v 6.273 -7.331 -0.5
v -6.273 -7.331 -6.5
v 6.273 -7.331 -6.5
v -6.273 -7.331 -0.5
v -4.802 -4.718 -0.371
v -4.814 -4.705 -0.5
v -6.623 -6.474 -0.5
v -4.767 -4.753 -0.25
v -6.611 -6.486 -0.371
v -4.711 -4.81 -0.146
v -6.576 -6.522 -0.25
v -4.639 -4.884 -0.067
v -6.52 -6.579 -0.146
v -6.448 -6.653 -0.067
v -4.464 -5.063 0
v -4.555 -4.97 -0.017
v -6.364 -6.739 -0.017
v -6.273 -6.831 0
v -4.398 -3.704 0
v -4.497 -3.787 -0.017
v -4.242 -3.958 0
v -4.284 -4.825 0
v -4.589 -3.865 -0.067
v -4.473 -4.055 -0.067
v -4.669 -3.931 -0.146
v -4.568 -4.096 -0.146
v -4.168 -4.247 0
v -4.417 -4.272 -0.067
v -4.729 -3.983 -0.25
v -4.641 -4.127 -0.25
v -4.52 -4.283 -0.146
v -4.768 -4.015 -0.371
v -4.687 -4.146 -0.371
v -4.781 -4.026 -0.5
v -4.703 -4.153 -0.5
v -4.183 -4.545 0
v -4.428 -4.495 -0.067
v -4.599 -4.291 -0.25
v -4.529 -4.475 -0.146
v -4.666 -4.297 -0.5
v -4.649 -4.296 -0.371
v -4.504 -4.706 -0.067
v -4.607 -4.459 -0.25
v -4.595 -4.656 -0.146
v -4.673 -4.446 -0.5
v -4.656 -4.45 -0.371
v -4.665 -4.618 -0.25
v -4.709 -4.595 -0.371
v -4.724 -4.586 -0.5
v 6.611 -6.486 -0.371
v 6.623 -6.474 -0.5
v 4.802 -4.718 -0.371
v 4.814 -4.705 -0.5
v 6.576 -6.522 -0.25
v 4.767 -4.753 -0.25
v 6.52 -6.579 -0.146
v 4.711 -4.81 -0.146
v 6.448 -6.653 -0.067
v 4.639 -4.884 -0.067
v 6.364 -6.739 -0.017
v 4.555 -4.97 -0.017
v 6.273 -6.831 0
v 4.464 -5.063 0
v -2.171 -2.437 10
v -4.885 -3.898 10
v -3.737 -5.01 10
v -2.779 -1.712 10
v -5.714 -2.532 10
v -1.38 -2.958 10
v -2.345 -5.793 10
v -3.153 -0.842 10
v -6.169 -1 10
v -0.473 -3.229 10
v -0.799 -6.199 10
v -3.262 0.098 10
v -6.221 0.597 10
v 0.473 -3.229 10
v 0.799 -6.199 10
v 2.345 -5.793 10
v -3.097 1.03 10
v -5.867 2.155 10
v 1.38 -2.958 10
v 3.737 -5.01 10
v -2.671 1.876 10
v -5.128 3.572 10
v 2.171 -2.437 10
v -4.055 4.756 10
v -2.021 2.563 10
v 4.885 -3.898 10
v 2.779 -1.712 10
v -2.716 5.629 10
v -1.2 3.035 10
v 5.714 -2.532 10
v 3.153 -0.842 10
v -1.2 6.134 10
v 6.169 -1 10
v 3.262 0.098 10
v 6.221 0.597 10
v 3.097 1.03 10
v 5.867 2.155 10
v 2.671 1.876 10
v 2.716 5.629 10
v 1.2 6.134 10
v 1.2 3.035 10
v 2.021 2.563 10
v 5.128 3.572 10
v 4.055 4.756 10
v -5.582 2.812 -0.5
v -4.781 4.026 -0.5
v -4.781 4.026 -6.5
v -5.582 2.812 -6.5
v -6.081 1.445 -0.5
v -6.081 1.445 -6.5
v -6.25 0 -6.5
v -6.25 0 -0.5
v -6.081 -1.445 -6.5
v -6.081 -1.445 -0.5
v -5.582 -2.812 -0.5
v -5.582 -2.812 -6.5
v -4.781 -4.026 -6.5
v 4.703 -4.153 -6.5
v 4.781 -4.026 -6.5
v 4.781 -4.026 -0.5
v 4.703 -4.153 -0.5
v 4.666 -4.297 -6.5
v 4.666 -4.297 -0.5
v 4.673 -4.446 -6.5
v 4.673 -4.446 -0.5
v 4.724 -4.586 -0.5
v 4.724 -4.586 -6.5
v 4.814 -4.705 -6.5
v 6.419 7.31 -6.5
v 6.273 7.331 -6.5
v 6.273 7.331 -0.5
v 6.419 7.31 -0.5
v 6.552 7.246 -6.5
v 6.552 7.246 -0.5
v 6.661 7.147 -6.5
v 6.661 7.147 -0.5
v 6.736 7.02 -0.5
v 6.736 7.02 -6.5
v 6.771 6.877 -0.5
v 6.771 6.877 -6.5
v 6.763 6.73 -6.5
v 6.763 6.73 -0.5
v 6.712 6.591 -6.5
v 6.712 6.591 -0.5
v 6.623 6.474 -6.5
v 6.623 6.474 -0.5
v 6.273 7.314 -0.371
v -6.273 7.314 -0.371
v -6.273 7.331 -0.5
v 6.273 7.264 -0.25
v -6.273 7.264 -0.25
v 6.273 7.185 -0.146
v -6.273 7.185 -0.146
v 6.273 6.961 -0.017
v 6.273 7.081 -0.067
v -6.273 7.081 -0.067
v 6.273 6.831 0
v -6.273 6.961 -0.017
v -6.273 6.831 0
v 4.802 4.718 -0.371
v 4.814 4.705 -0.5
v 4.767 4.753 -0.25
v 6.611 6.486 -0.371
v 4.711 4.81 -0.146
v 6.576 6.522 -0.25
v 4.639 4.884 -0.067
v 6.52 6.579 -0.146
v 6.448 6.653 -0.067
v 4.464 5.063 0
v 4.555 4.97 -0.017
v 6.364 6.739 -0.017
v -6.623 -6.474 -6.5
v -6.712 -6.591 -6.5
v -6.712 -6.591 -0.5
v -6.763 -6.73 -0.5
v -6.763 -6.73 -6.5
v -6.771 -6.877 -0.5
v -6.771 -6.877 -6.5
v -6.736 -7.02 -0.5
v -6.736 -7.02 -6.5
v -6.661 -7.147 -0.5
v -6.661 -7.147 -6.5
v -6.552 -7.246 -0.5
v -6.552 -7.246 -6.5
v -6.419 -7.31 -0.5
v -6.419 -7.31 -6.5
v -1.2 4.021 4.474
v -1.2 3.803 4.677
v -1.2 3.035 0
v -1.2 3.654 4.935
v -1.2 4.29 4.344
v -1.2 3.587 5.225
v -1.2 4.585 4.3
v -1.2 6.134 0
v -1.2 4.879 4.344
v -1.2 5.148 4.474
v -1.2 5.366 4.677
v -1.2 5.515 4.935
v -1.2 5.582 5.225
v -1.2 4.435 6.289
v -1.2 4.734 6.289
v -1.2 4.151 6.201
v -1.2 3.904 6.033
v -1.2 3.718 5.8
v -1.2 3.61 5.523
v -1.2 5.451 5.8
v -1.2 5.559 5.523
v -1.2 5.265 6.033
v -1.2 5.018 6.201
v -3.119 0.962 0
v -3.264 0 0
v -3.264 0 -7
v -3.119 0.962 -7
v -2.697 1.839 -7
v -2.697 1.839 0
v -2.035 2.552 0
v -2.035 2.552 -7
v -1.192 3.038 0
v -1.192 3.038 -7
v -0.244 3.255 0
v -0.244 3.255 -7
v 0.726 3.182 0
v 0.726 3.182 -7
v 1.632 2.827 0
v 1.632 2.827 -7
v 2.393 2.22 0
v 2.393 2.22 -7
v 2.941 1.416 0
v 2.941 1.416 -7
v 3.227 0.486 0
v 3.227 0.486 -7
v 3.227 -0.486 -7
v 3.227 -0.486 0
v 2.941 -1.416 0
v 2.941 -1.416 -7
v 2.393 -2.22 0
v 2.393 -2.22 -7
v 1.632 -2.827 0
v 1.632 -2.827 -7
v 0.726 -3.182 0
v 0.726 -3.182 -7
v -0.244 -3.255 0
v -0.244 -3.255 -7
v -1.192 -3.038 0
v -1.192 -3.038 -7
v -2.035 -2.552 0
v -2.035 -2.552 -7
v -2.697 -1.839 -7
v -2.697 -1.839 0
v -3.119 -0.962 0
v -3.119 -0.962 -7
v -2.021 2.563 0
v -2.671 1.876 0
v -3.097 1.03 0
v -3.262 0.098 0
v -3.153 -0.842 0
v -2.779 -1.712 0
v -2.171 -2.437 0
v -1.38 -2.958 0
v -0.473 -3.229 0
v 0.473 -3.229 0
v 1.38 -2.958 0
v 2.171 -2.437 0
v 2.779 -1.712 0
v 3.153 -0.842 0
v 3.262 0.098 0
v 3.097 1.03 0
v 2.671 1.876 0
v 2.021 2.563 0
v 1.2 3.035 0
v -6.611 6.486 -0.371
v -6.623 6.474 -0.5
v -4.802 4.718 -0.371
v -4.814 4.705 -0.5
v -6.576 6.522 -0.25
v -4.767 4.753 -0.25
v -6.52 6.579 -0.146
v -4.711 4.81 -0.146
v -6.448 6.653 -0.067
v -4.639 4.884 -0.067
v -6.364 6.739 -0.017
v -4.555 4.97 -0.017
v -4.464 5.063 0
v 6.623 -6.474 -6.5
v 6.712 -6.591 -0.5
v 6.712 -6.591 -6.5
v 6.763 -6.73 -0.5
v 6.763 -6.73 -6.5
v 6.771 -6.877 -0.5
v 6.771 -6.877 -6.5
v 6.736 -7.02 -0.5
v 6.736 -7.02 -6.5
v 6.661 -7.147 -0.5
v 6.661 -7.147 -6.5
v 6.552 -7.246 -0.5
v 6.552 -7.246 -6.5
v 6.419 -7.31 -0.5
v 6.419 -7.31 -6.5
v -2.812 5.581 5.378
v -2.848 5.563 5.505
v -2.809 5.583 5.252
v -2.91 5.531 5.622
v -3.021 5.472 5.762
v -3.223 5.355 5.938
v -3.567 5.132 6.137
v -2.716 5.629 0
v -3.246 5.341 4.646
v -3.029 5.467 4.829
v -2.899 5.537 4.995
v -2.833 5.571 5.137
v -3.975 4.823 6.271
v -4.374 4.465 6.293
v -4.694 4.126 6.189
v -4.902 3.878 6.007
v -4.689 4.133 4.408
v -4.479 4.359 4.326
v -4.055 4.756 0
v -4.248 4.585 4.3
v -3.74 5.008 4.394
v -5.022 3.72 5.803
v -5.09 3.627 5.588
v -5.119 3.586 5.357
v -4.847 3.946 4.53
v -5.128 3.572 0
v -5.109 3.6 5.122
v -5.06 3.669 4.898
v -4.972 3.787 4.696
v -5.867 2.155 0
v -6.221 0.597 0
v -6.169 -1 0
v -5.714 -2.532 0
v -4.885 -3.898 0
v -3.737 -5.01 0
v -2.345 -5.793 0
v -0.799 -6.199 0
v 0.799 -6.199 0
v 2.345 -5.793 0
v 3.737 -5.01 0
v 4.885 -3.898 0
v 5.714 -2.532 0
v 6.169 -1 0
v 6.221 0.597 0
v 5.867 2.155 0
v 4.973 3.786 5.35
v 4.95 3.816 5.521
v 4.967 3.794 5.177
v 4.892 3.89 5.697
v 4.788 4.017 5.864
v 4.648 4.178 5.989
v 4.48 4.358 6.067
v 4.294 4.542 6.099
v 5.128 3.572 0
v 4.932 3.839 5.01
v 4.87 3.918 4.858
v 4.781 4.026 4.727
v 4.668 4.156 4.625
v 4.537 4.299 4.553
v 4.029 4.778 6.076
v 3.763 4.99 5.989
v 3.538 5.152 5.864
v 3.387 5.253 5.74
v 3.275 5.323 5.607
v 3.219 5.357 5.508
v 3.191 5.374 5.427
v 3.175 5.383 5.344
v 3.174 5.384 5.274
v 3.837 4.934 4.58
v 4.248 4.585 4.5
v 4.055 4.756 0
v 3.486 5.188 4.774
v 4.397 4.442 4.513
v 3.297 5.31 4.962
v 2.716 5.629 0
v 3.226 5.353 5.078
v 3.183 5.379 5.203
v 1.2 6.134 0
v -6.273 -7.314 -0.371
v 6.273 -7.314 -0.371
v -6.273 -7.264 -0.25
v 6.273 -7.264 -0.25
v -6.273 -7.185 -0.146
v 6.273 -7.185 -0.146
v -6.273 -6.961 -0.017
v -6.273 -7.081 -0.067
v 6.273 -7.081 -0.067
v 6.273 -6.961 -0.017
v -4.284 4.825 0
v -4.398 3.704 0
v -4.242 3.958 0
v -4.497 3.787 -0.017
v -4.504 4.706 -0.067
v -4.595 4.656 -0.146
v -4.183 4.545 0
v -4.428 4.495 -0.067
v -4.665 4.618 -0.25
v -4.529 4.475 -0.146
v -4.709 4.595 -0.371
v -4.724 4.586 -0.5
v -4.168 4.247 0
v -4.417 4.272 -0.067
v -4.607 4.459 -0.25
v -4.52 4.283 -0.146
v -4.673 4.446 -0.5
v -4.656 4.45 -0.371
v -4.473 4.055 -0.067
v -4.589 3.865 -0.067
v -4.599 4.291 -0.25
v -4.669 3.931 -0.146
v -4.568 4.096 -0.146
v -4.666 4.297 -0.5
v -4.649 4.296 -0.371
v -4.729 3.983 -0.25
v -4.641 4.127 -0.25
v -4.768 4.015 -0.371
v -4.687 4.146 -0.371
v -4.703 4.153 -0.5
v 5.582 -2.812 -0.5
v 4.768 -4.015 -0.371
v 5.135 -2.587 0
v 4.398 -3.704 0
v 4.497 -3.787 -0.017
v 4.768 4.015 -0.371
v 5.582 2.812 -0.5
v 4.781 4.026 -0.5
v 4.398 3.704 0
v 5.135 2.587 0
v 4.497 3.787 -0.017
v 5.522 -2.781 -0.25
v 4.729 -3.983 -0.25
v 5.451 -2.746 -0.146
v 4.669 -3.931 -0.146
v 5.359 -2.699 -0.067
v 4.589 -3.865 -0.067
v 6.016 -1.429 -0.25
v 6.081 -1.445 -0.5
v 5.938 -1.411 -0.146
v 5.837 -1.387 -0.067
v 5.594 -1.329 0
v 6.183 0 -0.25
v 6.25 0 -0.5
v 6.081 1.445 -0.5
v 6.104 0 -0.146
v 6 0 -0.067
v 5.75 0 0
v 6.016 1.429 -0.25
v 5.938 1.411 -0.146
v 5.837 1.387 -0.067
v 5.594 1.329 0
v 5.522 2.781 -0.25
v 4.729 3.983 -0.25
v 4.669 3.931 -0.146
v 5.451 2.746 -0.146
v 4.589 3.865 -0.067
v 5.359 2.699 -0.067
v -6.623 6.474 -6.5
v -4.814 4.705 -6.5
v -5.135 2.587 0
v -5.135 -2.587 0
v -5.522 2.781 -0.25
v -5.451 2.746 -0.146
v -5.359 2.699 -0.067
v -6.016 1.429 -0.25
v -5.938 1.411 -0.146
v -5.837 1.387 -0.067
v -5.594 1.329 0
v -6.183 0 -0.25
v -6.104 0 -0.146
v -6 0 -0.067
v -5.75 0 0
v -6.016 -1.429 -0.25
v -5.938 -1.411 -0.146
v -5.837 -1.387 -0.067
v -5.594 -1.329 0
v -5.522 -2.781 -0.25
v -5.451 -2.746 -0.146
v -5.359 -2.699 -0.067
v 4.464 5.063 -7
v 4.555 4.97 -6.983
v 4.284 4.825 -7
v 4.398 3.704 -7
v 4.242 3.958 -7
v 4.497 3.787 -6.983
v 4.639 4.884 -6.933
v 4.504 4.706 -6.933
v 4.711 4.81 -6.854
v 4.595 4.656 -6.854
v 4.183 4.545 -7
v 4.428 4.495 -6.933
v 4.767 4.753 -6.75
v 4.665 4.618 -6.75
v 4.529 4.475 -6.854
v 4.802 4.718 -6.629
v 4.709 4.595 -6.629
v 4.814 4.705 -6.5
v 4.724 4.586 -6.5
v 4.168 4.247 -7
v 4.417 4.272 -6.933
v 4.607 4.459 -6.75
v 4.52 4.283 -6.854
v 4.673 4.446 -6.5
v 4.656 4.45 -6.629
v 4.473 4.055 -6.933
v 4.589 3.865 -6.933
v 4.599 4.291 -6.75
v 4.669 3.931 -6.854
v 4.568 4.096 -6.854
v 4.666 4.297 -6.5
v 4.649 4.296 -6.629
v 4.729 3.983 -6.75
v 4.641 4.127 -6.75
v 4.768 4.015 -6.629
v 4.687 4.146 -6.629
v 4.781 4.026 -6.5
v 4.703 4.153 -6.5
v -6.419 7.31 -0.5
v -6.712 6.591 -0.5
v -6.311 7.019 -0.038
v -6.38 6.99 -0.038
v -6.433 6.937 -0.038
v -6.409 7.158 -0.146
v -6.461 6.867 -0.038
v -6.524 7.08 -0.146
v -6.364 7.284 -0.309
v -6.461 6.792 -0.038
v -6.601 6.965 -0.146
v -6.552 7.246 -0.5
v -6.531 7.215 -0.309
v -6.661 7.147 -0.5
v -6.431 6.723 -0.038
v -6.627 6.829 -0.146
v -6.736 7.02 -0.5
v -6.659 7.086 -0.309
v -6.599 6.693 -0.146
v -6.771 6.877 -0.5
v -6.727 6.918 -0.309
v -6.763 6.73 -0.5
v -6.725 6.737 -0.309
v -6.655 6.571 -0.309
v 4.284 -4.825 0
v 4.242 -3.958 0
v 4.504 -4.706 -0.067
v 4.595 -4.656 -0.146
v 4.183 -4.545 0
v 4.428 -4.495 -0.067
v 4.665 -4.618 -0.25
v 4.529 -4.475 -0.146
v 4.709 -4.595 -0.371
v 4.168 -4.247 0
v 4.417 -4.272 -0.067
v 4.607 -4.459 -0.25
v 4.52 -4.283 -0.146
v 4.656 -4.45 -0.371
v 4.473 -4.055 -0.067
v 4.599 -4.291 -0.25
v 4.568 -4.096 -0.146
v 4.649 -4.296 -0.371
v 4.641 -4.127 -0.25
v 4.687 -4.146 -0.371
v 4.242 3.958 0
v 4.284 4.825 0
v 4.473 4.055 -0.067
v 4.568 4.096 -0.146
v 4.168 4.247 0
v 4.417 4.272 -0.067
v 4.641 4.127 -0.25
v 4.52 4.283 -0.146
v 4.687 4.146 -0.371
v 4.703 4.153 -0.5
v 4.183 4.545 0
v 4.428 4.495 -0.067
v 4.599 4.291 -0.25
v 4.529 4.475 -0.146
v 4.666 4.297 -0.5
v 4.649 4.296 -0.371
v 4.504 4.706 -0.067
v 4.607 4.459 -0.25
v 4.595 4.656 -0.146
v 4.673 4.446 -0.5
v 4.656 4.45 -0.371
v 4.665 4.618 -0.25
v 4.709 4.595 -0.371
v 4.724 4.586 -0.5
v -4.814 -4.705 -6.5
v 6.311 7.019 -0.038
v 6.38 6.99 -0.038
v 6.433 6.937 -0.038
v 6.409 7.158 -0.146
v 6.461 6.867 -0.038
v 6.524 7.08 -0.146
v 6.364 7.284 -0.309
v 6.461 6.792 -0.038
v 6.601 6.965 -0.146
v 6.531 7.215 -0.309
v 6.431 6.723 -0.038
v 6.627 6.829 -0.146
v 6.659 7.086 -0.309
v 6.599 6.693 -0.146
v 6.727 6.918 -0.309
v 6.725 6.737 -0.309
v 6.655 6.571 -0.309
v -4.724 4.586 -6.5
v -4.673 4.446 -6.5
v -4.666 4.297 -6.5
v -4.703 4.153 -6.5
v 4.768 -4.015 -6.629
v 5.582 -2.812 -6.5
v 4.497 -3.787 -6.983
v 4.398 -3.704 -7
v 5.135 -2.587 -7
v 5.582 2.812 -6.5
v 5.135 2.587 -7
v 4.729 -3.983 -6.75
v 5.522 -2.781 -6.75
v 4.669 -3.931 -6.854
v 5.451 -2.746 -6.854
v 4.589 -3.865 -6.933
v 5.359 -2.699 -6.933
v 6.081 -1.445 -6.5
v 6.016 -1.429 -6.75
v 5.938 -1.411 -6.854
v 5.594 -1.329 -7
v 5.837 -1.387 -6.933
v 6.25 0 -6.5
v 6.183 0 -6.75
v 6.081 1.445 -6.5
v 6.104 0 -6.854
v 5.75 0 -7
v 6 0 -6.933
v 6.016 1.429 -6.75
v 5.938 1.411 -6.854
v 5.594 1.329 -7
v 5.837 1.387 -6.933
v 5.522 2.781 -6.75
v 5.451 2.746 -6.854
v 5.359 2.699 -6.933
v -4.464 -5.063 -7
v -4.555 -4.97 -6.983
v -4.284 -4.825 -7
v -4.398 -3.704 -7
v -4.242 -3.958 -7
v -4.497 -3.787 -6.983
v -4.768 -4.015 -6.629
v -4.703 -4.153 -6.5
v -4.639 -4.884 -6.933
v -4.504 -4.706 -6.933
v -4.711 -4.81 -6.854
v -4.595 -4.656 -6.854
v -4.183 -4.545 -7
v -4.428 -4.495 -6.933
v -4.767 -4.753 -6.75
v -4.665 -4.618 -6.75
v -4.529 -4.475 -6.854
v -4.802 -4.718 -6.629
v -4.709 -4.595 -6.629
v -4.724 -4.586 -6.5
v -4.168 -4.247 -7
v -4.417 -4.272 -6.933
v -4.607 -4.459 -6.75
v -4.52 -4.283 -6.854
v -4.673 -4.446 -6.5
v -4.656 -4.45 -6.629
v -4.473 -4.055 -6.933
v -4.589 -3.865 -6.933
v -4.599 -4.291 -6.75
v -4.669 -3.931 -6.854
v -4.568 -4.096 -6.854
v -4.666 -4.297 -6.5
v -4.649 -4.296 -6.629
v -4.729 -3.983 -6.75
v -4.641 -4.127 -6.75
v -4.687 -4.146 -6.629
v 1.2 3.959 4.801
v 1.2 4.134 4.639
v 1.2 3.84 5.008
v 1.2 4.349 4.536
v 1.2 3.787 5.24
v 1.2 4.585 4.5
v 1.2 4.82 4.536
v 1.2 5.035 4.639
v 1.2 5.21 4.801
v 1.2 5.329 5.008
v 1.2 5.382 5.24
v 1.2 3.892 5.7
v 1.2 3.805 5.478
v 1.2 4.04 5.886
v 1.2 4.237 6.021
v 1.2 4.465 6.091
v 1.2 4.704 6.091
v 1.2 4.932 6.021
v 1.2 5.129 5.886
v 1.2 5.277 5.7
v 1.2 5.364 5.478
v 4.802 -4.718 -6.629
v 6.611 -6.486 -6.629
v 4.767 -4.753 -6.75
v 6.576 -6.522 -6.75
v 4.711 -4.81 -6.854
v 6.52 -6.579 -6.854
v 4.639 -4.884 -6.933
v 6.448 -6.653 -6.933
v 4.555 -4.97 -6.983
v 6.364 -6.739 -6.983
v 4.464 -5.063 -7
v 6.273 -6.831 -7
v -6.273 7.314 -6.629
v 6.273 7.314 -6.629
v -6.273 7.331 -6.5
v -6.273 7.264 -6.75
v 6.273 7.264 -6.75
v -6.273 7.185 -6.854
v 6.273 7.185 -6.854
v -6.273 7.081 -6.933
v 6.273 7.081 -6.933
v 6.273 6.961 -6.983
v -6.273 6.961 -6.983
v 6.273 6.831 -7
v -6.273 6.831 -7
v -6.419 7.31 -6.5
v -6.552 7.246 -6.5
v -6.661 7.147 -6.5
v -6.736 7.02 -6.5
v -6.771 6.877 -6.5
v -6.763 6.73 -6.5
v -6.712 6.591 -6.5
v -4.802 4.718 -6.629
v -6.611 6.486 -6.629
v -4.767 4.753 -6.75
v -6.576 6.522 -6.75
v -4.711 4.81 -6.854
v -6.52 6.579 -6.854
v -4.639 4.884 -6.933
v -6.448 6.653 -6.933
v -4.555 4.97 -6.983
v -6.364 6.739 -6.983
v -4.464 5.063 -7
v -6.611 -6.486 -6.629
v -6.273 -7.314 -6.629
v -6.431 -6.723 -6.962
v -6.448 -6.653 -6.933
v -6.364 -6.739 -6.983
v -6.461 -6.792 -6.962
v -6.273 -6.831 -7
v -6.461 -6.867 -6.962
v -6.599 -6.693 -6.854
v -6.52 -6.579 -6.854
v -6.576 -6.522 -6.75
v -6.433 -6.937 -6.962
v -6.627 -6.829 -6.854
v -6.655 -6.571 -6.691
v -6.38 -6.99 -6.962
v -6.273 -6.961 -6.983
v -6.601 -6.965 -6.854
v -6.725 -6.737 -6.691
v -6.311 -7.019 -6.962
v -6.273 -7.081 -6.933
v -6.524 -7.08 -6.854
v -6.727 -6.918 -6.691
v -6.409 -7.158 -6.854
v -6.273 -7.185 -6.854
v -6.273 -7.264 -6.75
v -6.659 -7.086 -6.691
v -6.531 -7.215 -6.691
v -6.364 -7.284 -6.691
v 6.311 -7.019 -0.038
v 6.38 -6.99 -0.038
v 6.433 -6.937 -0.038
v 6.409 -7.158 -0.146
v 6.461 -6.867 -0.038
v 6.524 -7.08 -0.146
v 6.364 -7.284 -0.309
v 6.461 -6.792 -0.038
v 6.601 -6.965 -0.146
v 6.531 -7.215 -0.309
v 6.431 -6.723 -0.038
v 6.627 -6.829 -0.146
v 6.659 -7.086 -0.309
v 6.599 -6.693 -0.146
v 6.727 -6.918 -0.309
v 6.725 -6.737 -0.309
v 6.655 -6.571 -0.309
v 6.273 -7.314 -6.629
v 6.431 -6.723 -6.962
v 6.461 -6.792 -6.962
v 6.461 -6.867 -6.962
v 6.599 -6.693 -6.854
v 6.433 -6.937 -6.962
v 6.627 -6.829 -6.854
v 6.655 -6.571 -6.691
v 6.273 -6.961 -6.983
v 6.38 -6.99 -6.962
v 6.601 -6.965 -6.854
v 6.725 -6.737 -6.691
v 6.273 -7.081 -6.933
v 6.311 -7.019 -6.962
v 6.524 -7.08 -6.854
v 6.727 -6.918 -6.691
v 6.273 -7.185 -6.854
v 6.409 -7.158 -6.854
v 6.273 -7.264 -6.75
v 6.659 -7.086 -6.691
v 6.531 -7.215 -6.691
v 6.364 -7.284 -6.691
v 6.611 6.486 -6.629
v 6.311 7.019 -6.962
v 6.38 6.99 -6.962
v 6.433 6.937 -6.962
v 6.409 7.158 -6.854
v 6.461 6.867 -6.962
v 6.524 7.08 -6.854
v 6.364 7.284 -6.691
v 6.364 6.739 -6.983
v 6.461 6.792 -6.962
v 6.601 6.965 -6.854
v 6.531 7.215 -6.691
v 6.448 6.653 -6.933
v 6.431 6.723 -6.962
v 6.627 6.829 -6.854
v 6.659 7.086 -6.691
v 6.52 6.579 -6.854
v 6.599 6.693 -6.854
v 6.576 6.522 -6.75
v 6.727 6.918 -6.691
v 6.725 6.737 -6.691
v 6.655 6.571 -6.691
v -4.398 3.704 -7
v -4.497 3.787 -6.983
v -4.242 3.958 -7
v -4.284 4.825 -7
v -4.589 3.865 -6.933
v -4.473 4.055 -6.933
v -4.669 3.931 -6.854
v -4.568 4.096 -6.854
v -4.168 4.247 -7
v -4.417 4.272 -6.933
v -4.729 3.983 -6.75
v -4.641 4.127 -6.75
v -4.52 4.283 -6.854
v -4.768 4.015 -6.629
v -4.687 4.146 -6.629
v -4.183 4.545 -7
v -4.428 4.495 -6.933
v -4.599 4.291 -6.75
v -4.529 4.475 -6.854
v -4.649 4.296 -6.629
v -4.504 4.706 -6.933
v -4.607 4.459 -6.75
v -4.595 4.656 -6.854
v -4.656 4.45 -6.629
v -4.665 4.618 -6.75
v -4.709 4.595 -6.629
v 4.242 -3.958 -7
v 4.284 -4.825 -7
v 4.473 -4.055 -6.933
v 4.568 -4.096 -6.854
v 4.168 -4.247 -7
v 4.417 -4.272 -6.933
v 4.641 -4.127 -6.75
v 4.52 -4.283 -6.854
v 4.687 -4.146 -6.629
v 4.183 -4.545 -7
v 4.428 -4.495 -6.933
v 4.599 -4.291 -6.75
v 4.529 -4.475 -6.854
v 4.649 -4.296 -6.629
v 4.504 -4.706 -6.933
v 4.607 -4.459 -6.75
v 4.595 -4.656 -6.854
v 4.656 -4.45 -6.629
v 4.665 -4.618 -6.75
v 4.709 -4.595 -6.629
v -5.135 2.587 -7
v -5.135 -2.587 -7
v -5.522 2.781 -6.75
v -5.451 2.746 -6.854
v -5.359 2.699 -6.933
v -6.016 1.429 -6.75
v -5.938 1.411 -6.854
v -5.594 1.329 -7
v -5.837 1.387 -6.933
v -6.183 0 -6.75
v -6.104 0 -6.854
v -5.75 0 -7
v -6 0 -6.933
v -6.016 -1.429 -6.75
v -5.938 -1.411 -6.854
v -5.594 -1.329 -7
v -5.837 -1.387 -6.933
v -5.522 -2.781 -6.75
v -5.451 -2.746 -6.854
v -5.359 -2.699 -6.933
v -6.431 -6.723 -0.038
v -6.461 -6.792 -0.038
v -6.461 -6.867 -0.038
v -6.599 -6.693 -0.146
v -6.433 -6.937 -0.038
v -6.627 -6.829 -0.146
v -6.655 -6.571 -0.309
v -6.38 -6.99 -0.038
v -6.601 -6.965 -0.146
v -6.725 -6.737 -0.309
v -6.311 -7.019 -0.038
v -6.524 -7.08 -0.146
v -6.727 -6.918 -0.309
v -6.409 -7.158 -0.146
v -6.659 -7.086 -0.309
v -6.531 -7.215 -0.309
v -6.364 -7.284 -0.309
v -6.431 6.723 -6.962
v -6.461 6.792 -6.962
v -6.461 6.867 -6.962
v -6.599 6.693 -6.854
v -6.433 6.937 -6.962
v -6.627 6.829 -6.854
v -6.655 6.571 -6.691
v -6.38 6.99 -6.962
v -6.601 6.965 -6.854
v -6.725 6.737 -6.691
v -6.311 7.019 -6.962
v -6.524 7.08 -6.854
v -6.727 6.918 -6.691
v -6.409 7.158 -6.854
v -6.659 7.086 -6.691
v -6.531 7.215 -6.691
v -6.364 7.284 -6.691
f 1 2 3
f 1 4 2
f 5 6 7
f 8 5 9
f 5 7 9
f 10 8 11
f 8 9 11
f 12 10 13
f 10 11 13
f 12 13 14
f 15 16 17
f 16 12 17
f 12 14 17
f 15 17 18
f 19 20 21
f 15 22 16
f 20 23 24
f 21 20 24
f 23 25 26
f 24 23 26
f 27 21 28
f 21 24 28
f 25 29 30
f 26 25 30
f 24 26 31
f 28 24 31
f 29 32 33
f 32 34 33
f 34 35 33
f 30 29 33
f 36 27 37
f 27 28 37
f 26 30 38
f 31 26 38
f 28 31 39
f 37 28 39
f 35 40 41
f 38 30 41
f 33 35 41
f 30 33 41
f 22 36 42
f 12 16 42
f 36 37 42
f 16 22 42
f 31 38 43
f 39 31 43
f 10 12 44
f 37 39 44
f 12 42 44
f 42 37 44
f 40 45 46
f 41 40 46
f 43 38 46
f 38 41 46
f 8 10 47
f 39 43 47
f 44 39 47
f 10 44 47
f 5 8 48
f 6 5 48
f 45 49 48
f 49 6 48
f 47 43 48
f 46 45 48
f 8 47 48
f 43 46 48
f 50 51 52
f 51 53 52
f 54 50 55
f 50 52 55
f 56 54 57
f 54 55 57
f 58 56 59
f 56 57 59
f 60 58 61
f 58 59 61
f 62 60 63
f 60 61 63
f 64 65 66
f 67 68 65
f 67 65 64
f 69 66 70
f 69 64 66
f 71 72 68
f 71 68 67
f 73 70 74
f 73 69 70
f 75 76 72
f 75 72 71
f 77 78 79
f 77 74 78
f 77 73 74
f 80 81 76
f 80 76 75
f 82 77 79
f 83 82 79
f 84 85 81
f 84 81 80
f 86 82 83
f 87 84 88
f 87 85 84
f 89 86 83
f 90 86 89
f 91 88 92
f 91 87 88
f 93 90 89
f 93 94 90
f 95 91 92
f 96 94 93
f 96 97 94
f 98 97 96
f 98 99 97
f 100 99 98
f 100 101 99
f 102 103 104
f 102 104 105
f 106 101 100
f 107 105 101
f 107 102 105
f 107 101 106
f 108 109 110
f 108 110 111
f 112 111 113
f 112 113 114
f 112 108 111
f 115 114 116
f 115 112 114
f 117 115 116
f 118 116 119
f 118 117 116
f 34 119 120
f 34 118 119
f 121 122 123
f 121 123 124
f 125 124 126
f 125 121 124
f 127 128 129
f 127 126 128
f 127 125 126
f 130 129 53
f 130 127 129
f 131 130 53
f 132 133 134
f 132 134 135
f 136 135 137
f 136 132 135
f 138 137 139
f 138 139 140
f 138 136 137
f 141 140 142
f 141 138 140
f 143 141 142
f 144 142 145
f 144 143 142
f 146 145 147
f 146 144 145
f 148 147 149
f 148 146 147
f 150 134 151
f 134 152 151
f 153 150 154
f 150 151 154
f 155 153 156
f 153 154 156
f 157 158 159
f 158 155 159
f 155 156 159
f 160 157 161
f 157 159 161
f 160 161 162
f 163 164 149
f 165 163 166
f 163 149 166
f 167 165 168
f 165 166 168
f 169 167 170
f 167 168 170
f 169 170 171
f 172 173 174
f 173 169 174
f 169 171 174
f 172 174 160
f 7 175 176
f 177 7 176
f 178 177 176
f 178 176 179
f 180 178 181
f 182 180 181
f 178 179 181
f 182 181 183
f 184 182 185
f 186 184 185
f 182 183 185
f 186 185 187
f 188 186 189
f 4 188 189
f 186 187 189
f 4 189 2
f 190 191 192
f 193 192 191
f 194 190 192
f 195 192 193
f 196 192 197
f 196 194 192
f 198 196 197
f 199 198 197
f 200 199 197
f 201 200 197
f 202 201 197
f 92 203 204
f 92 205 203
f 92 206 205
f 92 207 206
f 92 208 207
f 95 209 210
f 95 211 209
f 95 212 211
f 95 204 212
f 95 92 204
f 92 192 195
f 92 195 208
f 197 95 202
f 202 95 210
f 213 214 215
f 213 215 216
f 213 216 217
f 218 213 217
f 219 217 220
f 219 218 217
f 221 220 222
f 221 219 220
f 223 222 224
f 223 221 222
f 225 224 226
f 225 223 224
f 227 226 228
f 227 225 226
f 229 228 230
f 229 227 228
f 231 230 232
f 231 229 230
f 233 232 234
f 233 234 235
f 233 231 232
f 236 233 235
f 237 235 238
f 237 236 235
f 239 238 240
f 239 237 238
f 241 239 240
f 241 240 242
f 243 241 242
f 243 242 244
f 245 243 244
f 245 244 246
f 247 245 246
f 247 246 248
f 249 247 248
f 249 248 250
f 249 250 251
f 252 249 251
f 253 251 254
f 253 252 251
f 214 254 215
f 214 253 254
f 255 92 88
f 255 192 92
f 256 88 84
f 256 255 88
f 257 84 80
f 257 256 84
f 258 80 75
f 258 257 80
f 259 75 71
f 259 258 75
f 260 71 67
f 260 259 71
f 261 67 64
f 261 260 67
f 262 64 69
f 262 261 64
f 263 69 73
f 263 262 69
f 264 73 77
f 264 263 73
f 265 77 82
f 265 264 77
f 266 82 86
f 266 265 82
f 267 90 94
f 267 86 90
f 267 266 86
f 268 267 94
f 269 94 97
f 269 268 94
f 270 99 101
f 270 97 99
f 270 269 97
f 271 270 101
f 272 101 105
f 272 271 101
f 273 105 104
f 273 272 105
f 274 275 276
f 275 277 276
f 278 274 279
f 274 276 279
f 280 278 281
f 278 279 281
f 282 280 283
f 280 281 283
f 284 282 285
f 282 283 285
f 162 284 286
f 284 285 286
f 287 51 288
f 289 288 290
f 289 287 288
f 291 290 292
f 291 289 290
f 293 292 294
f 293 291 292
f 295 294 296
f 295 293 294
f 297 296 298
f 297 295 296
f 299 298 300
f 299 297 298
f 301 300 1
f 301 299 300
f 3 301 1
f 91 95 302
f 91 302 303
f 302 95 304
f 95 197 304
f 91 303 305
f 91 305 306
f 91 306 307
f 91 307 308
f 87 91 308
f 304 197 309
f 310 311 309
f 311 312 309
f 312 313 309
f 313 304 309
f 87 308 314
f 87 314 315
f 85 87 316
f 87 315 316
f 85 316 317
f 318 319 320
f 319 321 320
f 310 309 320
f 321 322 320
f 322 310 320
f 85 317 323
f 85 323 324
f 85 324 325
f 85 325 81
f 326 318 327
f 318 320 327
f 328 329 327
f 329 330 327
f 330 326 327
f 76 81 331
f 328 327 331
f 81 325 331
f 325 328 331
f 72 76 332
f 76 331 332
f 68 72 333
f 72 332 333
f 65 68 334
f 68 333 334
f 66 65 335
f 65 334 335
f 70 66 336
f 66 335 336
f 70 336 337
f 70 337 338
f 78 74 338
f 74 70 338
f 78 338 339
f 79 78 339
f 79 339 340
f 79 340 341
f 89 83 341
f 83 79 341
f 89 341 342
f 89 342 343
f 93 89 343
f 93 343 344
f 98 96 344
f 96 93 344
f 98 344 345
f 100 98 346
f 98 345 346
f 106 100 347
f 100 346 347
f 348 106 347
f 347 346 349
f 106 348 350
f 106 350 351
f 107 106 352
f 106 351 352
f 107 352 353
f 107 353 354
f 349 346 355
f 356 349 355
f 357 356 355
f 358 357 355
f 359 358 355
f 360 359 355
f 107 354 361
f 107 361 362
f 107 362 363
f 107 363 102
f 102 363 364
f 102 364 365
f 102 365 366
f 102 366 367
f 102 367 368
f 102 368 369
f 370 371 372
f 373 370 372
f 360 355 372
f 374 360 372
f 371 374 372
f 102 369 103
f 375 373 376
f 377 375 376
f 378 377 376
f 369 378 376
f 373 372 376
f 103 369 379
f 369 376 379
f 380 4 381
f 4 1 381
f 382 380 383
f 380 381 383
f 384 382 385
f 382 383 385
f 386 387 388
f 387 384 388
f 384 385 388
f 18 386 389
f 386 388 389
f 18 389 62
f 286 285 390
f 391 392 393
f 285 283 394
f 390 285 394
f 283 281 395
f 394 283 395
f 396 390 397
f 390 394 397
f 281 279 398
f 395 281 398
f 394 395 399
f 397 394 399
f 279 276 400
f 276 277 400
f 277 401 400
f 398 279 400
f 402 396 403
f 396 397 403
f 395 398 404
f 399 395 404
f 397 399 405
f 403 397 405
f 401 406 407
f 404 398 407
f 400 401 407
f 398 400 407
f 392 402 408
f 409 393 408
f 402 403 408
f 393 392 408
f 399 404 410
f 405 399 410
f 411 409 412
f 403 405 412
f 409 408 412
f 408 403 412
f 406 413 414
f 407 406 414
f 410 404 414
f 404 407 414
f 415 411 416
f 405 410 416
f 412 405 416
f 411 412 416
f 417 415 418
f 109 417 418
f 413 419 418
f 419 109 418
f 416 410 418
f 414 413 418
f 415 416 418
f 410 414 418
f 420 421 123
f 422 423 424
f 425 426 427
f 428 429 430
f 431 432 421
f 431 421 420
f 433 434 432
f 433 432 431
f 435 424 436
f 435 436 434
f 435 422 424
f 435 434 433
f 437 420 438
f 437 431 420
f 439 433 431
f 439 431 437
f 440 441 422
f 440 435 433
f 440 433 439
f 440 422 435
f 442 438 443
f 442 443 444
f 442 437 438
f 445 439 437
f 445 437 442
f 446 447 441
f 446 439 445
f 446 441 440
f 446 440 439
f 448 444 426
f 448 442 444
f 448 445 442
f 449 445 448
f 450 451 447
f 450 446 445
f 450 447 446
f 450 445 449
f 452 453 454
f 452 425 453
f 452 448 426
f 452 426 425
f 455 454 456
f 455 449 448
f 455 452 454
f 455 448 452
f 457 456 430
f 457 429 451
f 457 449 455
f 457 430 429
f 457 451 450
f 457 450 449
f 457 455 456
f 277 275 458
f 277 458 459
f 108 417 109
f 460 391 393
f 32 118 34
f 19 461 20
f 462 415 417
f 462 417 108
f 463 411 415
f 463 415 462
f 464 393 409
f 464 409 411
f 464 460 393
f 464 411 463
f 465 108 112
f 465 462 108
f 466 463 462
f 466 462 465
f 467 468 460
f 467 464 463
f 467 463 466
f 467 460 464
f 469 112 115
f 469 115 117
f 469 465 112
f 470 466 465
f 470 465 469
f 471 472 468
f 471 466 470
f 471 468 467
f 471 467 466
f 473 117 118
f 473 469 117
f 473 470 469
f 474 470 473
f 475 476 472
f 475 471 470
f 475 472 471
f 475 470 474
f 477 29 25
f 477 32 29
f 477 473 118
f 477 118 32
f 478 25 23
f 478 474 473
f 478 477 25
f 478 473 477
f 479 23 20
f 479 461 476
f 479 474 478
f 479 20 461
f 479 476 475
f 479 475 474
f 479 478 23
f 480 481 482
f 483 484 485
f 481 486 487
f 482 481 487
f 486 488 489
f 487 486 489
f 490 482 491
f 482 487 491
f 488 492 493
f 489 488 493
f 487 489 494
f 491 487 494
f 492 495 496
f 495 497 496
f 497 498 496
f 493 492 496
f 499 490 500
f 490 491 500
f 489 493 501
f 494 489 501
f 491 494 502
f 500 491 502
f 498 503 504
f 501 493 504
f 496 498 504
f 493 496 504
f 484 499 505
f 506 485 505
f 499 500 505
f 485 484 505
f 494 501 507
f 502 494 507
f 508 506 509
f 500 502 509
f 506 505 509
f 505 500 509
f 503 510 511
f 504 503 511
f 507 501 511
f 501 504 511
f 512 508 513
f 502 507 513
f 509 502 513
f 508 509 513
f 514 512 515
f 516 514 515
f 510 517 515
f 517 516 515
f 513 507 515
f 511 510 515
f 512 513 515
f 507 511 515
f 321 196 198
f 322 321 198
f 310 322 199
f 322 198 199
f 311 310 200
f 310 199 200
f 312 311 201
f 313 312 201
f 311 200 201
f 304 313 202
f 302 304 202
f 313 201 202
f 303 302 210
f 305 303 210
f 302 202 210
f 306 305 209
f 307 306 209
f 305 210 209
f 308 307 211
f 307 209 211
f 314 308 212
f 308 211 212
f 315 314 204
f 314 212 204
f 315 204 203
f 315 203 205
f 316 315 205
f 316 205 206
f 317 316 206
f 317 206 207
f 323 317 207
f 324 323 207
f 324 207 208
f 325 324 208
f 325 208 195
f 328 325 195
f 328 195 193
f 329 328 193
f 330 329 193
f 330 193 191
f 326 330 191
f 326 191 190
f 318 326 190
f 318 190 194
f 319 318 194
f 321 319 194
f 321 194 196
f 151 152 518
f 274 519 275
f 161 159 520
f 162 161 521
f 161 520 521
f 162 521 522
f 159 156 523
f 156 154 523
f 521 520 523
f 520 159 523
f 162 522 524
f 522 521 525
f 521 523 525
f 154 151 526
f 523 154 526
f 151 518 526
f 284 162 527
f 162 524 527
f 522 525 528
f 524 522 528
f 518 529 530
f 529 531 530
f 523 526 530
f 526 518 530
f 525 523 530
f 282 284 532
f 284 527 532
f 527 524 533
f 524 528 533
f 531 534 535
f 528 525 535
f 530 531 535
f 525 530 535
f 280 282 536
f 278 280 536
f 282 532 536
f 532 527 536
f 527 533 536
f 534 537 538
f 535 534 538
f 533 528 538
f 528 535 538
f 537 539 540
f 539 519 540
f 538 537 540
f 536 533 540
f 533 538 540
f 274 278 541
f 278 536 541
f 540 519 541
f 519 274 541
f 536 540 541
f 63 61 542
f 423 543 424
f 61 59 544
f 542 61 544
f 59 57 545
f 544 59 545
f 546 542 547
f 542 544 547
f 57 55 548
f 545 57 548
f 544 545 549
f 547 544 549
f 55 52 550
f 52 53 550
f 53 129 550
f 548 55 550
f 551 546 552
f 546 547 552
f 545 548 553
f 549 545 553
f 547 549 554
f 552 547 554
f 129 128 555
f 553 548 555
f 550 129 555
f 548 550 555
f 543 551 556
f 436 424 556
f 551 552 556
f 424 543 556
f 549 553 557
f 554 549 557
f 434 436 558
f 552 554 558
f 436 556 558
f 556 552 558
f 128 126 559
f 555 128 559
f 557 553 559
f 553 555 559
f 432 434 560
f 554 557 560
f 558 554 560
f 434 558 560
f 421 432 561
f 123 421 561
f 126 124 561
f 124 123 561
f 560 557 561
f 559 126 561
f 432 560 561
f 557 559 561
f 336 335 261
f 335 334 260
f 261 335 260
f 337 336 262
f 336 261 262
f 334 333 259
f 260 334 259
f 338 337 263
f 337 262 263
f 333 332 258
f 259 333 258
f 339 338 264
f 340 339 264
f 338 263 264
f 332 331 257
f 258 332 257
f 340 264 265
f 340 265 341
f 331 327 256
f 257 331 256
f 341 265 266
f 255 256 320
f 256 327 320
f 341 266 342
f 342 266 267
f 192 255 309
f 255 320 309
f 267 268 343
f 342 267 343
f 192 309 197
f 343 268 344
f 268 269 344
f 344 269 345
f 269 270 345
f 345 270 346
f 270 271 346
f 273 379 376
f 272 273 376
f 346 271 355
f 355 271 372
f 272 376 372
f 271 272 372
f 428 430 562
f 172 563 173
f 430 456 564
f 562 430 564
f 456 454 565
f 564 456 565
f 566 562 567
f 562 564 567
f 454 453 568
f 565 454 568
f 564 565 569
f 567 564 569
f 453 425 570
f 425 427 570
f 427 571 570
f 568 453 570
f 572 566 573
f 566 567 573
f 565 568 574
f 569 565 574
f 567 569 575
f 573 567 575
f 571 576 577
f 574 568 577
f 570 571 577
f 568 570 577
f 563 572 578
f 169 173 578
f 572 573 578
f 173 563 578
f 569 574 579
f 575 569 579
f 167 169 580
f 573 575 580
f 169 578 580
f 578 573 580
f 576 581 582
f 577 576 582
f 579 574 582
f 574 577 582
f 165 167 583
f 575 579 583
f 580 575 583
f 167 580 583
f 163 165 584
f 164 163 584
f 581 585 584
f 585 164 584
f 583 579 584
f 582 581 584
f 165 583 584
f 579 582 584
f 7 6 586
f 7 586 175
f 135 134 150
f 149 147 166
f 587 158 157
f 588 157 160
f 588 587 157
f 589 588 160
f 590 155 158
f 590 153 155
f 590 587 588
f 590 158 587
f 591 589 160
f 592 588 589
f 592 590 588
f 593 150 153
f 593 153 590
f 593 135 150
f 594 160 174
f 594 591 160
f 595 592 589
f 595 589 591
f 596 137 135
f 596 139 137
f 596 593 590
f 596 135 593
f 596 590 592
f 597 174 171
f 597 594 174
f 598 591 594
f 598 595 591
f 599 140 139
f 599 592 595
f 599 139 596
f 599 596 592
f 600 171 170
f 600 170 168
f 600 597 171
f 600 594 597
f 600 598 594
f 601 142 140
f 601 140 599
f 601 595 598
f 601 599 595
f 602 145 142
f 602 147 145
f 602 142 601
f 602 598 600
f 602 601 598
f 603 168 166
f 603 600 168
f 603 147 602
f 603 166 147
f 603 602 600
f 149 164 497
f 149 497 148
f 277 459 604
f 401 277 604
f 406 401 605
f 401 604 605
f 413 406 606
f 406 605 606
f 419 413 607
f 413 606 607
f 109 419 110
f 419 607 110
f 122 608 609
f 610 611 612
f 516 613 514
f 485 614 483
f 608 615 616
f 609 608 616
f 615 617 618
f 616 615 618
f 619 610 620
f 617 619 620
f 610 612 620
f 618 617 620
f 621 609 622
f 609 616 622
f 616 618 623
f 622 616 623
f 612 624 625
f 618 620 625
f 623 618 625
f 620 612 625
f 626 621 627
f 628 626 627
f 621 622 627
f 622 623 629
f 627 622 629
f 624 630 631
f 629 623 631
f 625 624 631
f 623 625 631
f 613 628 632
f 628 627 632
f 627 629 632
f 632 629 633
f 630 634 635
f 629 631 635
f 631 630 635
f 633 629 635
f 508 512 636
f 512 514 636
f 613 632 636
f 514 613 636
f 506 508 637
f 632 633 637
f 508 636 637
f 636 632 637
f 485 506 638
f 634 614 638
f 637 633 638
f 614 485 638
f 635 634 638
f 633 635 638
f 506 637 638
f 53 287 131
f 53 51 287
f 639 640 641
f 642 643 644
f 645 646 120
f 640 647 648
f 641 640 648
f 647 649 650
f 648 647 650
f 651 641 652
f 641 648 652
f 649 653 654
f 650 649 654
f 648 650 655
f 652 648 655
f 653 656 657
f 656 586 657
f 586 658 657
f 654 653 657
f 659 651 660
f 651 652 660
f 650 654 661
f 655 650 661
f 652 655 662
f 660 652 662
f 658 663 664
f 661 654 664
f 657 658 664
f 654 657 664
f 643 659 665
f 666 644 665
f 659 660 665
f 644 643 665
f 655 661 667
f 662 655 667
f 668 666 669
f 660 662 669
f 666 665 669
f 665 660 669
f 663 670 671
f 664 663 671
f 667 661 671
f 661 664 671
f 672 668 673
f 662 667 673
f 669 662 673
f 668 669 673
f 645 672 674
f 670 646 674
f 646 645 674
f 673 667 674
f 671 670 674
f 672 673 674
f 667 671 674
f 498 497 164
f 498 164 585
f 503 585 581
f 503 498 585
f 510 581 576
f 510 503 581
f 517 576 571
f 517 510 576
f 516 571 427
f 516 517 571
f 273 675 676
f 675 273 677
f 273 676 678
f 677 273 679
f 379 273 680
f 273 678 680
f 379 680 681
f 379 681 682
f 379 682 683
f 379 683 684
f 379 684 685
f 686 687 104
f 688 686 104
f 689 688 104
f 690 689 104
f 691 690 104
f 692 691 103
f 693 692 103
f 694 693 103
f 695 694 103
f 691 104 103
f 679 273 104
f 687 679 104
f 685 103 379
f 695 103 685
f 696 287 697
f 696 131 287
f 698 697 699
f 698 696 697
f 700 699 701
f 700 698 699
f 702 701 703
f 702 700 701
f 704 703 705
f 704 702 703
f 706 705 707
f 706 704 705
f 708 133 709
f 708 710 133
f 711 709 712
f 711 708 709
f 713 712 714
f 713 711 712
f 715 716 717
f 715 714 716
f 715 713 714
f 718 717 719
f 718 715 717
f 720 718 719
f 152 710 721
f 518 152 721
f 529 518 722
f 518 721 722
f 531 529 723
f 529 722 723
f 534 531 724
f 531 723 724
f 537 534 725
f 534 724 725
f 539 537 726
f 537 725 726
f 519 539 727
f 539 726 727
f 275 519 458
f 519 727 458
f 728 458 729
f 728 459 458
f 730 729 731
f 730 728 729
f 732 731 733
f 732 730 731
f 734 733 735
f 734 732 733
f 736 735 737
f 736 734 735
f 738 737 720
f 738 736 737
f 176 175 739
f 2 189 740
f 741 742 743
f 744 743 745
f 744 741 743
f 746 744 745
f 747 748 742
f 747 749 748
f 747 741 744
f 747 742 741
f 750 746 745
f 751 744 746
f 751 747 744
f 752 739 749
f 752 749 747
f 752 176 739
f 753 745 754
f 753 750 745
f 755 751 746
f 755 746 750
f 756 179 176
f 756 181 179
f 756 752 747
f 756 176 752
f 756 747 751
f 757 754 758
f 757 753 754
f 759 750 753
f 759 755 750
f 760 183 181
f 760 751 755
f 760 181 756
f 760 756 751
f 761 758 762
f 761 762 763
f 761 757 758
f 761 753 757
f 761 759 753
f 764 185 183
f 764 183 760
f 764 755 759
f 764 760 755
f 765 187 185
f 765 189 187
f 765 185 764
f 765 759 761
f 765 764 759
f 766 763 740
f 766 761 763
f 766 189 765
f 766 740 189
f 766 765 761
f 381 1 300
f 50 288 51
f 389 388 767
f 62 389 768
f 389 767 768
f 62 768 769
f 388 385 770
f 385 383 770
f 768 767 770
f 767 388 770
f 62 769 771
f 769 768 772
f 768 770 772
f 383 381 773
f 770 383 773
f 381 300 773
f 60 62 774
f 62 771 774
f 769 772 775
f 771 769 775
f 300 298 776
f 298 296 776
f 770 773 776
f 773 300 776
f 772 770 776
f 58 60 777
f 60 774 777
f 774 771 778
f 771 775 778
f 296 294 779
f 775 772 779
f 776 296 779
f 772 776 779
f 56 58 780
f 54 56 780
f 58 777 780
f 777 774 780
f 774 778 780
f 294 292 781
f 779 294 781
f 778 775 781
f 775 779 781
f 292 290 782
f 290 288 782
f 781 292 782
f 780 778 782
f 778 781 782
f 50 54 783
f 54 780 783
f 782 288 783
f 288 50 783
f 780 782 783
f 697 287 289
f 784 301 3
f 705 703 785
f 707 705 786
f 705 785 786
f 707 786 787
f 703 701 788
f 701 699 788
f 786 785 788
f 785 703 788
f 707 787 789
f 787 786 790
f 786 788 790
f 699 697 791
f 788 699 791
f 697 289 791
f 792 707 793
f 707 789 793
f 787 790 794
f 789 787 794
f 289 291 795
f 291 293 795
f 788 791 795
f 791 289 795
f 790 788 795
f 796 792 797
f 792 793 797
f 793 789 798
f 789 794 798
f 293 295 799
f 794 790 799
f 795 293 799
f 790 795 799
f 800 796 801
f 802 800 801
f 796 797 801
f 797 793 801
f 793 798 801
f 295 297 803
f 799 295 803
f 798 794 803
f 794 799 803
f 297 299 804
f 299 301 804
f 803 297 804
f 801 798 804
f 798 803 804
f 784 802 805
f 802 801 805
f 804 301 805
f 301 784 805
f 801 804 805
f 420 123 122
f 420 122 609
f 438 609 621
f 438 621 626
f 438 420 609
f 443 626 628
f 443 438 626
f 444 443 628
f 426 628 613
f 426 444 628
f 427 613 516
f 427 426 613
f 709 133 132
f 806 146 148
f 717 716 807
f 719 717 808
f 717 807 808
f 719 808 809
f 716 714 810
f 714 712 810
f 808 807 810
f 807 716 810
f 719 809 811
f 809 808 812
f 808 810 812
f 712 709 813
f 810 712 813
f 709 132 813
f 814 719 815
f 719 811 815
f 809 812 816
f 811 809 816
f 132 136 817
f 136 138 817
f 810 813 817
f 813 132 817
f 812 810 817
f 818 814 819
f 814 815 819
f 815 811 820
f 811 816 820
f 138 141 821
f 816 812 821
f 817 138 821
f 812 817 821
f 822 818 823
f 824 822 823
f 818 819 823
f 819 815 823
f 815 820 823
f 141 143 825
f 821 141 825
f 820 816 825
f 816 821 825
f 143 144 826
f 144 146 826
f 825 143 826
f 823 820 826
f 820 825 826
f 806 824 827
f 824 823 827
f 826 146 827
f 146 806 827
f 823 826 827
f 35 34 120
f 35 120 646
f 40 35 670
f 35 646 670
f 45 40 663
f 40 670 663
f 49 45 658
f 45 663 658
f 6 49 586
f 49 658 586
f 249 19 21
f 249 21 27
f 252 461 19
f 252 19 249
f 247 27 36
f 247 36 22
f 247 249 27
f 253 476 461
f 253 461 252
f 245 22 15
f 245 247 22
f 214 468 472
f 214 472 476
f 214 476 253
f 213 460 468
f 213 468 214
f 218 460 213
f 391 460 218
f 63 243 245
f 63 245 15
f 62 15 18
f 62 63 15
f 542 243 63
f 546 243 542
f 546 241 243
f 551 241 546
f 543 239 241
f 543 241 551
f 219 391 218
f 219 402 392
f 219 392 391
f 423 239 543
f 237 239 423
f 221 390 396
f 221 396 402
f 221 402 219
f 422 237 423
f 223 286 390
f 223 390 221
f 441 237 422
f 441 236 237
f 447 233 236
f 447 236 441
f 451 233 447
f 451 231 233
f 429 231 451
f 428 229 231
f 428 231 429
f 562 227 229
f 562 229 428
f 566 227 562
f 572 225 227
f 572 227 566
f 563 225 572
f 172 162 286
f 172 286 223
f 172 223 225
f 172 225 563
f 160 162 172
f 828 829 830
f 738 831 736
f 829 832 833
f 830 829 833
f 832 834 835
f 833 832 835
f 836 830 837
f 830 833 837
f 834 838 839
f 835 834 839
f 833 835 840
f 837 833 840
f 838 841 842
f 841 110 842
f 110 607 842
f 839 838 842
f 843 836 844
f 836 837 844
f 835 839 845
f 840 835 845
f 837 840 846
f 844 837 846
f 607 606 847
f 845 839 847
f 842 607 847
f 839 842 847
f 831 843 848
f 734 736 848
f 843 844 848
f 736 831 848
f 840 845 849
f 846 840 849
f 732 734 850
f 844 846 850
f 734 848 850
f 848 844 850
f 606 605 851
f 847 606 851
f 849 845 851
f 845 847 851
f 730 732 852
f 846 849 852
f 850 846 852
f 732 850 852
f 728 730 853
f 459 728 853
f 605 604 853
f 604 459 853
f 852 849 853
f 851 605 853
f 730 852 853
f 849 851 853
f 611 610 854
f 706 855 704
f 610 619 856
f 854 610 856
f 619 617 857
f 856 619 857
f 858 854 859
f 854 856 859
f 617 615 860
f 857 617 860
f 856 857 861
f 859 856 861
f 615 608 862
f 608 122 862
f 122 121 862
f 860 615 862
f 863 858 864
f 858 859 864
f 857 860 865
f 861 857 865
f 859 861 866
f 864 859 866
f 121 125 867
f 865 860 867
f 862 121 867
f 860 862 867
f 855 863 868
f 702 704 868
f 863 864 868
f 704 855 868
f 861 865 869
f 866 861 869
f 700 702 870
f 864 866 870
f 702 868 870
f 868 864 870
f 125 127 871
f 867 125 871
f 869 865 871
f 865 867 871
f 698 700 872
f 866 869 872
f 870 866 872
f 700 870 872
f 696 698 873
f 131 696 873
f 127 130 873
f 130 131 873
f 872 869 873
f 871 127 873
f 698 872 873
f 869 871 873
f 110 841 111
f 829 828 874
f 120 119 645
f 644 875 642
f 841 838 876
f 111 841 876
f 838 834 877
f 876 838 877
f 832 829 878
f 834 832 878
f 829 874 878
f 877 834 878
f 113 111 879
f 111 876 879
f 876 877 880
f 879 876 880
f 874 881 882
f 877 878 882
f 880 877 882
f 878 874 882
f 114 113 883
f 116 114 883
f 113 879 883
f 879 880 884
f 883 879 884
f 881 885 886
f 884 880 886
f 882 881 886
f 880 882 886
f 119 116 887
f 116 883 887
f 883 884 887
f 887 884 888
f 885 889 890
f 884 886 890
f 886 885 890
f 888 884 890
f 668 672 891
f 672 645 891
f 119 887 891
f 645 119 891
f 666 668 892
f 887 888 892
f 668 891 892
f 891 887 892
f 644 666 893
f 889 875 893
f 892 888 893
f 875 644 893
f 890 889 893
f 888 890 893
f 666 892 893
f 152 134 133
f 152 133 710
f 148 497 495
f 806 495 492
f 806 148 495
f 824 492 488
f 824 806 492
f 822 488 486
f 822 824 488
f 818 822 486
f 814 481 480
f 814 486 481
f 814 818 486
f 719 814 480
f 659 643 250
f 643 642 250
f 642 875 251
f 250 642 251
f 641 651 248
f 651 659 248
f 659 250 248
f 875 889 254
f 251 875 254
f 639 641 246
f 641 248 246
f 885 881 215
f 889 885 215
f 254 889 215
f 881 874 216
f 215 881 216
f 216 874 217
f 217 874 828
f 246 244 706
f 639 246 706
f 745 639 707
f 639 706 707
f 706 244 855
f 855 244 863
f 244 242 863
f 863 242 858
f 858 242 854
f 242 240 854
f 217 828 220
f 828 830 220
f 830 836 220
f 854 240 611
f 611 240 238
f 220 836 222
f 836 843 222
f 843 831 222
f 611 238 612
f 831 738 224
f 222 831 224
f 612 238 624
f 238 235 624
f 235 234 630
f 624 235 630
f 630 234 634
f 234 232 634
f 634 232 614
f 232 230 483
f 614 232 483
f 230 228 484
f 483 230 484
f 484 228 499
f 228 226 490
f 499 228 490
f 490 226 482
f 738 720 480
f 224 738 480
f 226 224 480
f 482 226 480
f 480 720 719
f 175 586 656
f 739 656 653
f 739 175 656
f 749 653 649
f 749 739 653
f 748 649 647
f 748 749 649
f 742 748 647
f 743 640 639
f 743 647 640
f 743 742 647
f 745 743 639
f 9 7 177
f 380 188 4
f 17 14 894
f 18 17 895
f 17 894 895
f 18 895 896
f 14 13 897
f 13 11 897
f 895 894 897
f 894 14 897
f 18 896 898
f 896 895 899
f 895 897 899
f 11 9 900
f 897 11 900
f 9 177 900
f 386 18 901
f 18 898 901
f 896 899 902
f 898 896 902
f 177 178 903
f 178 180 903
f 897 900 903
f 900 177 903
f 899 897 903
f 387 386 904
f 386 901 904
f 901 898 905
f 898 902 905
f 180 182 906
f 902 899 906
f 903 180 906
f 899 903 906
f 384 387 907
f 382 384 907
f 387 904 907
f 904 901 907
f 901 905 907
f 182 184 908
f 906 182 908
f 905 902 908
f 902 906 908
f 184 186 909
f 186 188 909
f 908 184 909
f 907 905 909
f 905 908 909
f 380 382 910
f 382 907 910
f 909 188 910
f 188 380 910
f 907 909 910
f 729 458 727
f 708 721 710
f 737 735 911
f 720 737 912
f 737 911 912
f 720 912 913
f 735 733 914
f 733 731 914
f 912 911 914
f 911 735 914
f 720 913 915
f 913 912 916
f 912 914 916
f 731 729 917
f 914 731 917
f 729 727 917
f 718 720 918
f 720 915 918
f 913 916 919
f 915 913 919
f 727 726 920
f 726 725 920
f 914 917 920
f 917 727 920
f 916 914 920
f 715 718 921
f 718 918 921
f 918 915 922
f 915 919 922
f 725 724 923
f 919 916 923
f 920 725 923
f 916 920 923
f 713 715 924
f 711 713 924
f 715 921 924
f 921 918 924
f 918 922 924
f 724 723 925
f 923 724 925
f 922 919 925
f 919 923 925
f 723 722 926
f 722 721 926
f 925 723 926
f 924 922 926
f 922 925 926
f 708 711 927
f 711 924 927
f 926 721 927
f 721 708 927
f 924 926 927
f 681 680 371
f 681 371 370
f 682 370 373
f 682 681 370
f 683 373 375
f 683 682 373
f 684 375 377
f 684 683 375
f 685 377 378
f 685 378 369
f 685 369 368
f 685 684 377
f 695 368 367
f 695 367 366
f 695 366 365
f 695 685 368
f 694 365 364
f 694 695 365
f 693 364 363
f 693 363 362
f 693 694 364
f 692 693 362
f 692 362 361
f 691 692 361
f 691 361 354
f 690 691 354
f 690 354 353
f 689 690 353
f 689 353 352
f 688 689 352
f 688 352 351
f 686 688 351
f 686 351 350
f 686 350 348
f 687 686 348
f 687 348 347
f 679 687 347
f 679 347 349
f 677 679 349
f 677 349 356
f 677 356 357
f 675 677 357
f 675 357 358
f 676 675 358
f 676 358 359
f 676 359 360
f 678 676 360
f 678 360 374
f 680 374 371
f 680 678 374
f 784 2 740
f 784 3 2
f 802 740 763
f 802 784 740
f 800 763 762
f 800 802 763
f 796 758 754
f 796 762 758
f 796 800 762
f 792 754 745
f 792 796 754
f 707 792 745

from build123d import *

# Parameters (mm, degrees)
SKETCH1_R           = 6.25
SKETCH1_R_2         = 3.2639
BOSS_EXTRUDE1_DEPTH = 10
SKETCH2_R           = 3.2639
BOSS_EXTRUDE2_DEPTH = 7
SKETCH3_W           = 2.4
SKETCH3_H           = 5.152631641
CUT_EXTRUDE1_DEPTH  = 10
SKETCH4_R           = 1
CUT_EXTRUDE2_DEPTH  = 8.5
SKETCH5_R           = 0.8
M2X_4_THREAD_DEPTH  = 9.5
FILLET2_R           = 0.5


with BuildPart() as part:
    # Sketch1 → Boss-Extrude1 (new body)
    with BuildSketch(Plane.XY):
        Circle(SKETCH1_R)
        Circle(SKETCH1_R_2, mode=Mode.SUBTRACT)
    extrude(amount=BOSS_EXTRUDE1_DEPTH)

    # Sketch3 → Cut-Extrude1 (cut)
    with BuildSketch(Plane.XY.offset(10)):
        with Locations((0, 4.528492236)):
            Rectangle(SKETCH3_W, SKETCH3_H)
    extrude(amount=-CUT_EXTRUDE1_DEPTH, mode=Mode.SUBTRACT)

    # Sketch4 → Cut-Extrude2 (cut, through all)
    with BuildSketch(Plane(origin=(0, 0, 0), x_dir=(0, 0, -1), z_dir=(1, 0, 0))):
        with Locations((-5.3, 4.584508905)):
            Circle(SKETCH4_R)
    extrude(amount=-CUT_EXTRUDE2_DEPTH, mode=Mode.SUBTRACT)

    # Sketch5 → m2x.4 thread (cut)
    with BuildSketch(Plane(origin=(0, 0, 0), x_dir=(0, 0, -1), z_dir=(1, 0, 0))):
        with Locations((-5.3, 4.584508905)):
            Circle(SKETCH5_R)
    extrude(amount=M2X_4_THREAD_DEPTH, mode=Mode.SUBTRACT)


with BuildPart() as body_2:
    # Sketch2 → Boss-Extrude2 (new body)
    with BuildSketch(Plane(origin=(0, 0, 0), x_dir=(-1, 0, 0), z_dir=(0, 0, -1))):
        with BuildLine():
            Line((-7.5, 7.331363016), (7.5, 7.331363016))
            Line((7.5, 7.331363016), (4.469378566, 4.368884896))
            ThreePointArc((4.469378566, 4.368884896), (6.25, 0), (4.469378566, -4.368884896))
            Line((4.469378566, -4.368884896), (7.5, -7.331363016))
            Line((7.5, -7.331363016), (-7.5, -7.331363016))
            Line((-7.5, -7.331363016), (-4.469378566, -4.368884896))
            ThreePointArc((-4.469378566, -4.368884896), (-6.25, 0), (-4.469378566, 4.368884896))
            Line((-4.469378566, 4.368884896), (-7.5, 7.331363016))
        make_face()
        Circle(SKETCH2_R, mode=Mode.SUBTRACT)
    extrude(amount=BOSS_EXTRUDE2_DEPTH)

    # Fillet2
    fillet2_edges = [body_2.edges().sort_by_distance(p)[0] for p in [
        (5.984689283, -5.850123956, -7),
        (6.25, 0, 0),
        (5.984689283, 5.850123956, 0),
        (0, -7.331363016, -7),
        (7.5, 7.331363016, -3.5),
        (-7.5, 7.331363016, -3.5),
        (-4.469378566, 4.368884896, -3.5),
        (-4.469378566, -4.368884896, -3.5),
        (-7.5, -7.331363016, -3.5),
        (7.5, -7.331363016, -3.5),
        (4.469378566, -4.368884896, -3.5),
        (4.469378566, 4.368884896, -3.5),
        (-5.984689283, -5.850123956, -7),
        (-6.25, 0, -7),
        (-5.984689283, 5.850123956, -7),
        (0, 7.331363016, -7),
        (5.984689283, 5.850123956, -7),
        (6.25, 0, -7),
        (0, 7.331363016, 0),
        (-5.984689283, 5.850123956, 0),
        (-6.25, 0, 0),
        (-5.984689283, -5.850123956, 0),
        (0, -7.331363016, 0),
        (5.984689283, -5.850123956, 0),
    ]]
    fillet(fillet2_edges, radius=FILLET2_R)


solid = Compound([part.part, body_2.part])
